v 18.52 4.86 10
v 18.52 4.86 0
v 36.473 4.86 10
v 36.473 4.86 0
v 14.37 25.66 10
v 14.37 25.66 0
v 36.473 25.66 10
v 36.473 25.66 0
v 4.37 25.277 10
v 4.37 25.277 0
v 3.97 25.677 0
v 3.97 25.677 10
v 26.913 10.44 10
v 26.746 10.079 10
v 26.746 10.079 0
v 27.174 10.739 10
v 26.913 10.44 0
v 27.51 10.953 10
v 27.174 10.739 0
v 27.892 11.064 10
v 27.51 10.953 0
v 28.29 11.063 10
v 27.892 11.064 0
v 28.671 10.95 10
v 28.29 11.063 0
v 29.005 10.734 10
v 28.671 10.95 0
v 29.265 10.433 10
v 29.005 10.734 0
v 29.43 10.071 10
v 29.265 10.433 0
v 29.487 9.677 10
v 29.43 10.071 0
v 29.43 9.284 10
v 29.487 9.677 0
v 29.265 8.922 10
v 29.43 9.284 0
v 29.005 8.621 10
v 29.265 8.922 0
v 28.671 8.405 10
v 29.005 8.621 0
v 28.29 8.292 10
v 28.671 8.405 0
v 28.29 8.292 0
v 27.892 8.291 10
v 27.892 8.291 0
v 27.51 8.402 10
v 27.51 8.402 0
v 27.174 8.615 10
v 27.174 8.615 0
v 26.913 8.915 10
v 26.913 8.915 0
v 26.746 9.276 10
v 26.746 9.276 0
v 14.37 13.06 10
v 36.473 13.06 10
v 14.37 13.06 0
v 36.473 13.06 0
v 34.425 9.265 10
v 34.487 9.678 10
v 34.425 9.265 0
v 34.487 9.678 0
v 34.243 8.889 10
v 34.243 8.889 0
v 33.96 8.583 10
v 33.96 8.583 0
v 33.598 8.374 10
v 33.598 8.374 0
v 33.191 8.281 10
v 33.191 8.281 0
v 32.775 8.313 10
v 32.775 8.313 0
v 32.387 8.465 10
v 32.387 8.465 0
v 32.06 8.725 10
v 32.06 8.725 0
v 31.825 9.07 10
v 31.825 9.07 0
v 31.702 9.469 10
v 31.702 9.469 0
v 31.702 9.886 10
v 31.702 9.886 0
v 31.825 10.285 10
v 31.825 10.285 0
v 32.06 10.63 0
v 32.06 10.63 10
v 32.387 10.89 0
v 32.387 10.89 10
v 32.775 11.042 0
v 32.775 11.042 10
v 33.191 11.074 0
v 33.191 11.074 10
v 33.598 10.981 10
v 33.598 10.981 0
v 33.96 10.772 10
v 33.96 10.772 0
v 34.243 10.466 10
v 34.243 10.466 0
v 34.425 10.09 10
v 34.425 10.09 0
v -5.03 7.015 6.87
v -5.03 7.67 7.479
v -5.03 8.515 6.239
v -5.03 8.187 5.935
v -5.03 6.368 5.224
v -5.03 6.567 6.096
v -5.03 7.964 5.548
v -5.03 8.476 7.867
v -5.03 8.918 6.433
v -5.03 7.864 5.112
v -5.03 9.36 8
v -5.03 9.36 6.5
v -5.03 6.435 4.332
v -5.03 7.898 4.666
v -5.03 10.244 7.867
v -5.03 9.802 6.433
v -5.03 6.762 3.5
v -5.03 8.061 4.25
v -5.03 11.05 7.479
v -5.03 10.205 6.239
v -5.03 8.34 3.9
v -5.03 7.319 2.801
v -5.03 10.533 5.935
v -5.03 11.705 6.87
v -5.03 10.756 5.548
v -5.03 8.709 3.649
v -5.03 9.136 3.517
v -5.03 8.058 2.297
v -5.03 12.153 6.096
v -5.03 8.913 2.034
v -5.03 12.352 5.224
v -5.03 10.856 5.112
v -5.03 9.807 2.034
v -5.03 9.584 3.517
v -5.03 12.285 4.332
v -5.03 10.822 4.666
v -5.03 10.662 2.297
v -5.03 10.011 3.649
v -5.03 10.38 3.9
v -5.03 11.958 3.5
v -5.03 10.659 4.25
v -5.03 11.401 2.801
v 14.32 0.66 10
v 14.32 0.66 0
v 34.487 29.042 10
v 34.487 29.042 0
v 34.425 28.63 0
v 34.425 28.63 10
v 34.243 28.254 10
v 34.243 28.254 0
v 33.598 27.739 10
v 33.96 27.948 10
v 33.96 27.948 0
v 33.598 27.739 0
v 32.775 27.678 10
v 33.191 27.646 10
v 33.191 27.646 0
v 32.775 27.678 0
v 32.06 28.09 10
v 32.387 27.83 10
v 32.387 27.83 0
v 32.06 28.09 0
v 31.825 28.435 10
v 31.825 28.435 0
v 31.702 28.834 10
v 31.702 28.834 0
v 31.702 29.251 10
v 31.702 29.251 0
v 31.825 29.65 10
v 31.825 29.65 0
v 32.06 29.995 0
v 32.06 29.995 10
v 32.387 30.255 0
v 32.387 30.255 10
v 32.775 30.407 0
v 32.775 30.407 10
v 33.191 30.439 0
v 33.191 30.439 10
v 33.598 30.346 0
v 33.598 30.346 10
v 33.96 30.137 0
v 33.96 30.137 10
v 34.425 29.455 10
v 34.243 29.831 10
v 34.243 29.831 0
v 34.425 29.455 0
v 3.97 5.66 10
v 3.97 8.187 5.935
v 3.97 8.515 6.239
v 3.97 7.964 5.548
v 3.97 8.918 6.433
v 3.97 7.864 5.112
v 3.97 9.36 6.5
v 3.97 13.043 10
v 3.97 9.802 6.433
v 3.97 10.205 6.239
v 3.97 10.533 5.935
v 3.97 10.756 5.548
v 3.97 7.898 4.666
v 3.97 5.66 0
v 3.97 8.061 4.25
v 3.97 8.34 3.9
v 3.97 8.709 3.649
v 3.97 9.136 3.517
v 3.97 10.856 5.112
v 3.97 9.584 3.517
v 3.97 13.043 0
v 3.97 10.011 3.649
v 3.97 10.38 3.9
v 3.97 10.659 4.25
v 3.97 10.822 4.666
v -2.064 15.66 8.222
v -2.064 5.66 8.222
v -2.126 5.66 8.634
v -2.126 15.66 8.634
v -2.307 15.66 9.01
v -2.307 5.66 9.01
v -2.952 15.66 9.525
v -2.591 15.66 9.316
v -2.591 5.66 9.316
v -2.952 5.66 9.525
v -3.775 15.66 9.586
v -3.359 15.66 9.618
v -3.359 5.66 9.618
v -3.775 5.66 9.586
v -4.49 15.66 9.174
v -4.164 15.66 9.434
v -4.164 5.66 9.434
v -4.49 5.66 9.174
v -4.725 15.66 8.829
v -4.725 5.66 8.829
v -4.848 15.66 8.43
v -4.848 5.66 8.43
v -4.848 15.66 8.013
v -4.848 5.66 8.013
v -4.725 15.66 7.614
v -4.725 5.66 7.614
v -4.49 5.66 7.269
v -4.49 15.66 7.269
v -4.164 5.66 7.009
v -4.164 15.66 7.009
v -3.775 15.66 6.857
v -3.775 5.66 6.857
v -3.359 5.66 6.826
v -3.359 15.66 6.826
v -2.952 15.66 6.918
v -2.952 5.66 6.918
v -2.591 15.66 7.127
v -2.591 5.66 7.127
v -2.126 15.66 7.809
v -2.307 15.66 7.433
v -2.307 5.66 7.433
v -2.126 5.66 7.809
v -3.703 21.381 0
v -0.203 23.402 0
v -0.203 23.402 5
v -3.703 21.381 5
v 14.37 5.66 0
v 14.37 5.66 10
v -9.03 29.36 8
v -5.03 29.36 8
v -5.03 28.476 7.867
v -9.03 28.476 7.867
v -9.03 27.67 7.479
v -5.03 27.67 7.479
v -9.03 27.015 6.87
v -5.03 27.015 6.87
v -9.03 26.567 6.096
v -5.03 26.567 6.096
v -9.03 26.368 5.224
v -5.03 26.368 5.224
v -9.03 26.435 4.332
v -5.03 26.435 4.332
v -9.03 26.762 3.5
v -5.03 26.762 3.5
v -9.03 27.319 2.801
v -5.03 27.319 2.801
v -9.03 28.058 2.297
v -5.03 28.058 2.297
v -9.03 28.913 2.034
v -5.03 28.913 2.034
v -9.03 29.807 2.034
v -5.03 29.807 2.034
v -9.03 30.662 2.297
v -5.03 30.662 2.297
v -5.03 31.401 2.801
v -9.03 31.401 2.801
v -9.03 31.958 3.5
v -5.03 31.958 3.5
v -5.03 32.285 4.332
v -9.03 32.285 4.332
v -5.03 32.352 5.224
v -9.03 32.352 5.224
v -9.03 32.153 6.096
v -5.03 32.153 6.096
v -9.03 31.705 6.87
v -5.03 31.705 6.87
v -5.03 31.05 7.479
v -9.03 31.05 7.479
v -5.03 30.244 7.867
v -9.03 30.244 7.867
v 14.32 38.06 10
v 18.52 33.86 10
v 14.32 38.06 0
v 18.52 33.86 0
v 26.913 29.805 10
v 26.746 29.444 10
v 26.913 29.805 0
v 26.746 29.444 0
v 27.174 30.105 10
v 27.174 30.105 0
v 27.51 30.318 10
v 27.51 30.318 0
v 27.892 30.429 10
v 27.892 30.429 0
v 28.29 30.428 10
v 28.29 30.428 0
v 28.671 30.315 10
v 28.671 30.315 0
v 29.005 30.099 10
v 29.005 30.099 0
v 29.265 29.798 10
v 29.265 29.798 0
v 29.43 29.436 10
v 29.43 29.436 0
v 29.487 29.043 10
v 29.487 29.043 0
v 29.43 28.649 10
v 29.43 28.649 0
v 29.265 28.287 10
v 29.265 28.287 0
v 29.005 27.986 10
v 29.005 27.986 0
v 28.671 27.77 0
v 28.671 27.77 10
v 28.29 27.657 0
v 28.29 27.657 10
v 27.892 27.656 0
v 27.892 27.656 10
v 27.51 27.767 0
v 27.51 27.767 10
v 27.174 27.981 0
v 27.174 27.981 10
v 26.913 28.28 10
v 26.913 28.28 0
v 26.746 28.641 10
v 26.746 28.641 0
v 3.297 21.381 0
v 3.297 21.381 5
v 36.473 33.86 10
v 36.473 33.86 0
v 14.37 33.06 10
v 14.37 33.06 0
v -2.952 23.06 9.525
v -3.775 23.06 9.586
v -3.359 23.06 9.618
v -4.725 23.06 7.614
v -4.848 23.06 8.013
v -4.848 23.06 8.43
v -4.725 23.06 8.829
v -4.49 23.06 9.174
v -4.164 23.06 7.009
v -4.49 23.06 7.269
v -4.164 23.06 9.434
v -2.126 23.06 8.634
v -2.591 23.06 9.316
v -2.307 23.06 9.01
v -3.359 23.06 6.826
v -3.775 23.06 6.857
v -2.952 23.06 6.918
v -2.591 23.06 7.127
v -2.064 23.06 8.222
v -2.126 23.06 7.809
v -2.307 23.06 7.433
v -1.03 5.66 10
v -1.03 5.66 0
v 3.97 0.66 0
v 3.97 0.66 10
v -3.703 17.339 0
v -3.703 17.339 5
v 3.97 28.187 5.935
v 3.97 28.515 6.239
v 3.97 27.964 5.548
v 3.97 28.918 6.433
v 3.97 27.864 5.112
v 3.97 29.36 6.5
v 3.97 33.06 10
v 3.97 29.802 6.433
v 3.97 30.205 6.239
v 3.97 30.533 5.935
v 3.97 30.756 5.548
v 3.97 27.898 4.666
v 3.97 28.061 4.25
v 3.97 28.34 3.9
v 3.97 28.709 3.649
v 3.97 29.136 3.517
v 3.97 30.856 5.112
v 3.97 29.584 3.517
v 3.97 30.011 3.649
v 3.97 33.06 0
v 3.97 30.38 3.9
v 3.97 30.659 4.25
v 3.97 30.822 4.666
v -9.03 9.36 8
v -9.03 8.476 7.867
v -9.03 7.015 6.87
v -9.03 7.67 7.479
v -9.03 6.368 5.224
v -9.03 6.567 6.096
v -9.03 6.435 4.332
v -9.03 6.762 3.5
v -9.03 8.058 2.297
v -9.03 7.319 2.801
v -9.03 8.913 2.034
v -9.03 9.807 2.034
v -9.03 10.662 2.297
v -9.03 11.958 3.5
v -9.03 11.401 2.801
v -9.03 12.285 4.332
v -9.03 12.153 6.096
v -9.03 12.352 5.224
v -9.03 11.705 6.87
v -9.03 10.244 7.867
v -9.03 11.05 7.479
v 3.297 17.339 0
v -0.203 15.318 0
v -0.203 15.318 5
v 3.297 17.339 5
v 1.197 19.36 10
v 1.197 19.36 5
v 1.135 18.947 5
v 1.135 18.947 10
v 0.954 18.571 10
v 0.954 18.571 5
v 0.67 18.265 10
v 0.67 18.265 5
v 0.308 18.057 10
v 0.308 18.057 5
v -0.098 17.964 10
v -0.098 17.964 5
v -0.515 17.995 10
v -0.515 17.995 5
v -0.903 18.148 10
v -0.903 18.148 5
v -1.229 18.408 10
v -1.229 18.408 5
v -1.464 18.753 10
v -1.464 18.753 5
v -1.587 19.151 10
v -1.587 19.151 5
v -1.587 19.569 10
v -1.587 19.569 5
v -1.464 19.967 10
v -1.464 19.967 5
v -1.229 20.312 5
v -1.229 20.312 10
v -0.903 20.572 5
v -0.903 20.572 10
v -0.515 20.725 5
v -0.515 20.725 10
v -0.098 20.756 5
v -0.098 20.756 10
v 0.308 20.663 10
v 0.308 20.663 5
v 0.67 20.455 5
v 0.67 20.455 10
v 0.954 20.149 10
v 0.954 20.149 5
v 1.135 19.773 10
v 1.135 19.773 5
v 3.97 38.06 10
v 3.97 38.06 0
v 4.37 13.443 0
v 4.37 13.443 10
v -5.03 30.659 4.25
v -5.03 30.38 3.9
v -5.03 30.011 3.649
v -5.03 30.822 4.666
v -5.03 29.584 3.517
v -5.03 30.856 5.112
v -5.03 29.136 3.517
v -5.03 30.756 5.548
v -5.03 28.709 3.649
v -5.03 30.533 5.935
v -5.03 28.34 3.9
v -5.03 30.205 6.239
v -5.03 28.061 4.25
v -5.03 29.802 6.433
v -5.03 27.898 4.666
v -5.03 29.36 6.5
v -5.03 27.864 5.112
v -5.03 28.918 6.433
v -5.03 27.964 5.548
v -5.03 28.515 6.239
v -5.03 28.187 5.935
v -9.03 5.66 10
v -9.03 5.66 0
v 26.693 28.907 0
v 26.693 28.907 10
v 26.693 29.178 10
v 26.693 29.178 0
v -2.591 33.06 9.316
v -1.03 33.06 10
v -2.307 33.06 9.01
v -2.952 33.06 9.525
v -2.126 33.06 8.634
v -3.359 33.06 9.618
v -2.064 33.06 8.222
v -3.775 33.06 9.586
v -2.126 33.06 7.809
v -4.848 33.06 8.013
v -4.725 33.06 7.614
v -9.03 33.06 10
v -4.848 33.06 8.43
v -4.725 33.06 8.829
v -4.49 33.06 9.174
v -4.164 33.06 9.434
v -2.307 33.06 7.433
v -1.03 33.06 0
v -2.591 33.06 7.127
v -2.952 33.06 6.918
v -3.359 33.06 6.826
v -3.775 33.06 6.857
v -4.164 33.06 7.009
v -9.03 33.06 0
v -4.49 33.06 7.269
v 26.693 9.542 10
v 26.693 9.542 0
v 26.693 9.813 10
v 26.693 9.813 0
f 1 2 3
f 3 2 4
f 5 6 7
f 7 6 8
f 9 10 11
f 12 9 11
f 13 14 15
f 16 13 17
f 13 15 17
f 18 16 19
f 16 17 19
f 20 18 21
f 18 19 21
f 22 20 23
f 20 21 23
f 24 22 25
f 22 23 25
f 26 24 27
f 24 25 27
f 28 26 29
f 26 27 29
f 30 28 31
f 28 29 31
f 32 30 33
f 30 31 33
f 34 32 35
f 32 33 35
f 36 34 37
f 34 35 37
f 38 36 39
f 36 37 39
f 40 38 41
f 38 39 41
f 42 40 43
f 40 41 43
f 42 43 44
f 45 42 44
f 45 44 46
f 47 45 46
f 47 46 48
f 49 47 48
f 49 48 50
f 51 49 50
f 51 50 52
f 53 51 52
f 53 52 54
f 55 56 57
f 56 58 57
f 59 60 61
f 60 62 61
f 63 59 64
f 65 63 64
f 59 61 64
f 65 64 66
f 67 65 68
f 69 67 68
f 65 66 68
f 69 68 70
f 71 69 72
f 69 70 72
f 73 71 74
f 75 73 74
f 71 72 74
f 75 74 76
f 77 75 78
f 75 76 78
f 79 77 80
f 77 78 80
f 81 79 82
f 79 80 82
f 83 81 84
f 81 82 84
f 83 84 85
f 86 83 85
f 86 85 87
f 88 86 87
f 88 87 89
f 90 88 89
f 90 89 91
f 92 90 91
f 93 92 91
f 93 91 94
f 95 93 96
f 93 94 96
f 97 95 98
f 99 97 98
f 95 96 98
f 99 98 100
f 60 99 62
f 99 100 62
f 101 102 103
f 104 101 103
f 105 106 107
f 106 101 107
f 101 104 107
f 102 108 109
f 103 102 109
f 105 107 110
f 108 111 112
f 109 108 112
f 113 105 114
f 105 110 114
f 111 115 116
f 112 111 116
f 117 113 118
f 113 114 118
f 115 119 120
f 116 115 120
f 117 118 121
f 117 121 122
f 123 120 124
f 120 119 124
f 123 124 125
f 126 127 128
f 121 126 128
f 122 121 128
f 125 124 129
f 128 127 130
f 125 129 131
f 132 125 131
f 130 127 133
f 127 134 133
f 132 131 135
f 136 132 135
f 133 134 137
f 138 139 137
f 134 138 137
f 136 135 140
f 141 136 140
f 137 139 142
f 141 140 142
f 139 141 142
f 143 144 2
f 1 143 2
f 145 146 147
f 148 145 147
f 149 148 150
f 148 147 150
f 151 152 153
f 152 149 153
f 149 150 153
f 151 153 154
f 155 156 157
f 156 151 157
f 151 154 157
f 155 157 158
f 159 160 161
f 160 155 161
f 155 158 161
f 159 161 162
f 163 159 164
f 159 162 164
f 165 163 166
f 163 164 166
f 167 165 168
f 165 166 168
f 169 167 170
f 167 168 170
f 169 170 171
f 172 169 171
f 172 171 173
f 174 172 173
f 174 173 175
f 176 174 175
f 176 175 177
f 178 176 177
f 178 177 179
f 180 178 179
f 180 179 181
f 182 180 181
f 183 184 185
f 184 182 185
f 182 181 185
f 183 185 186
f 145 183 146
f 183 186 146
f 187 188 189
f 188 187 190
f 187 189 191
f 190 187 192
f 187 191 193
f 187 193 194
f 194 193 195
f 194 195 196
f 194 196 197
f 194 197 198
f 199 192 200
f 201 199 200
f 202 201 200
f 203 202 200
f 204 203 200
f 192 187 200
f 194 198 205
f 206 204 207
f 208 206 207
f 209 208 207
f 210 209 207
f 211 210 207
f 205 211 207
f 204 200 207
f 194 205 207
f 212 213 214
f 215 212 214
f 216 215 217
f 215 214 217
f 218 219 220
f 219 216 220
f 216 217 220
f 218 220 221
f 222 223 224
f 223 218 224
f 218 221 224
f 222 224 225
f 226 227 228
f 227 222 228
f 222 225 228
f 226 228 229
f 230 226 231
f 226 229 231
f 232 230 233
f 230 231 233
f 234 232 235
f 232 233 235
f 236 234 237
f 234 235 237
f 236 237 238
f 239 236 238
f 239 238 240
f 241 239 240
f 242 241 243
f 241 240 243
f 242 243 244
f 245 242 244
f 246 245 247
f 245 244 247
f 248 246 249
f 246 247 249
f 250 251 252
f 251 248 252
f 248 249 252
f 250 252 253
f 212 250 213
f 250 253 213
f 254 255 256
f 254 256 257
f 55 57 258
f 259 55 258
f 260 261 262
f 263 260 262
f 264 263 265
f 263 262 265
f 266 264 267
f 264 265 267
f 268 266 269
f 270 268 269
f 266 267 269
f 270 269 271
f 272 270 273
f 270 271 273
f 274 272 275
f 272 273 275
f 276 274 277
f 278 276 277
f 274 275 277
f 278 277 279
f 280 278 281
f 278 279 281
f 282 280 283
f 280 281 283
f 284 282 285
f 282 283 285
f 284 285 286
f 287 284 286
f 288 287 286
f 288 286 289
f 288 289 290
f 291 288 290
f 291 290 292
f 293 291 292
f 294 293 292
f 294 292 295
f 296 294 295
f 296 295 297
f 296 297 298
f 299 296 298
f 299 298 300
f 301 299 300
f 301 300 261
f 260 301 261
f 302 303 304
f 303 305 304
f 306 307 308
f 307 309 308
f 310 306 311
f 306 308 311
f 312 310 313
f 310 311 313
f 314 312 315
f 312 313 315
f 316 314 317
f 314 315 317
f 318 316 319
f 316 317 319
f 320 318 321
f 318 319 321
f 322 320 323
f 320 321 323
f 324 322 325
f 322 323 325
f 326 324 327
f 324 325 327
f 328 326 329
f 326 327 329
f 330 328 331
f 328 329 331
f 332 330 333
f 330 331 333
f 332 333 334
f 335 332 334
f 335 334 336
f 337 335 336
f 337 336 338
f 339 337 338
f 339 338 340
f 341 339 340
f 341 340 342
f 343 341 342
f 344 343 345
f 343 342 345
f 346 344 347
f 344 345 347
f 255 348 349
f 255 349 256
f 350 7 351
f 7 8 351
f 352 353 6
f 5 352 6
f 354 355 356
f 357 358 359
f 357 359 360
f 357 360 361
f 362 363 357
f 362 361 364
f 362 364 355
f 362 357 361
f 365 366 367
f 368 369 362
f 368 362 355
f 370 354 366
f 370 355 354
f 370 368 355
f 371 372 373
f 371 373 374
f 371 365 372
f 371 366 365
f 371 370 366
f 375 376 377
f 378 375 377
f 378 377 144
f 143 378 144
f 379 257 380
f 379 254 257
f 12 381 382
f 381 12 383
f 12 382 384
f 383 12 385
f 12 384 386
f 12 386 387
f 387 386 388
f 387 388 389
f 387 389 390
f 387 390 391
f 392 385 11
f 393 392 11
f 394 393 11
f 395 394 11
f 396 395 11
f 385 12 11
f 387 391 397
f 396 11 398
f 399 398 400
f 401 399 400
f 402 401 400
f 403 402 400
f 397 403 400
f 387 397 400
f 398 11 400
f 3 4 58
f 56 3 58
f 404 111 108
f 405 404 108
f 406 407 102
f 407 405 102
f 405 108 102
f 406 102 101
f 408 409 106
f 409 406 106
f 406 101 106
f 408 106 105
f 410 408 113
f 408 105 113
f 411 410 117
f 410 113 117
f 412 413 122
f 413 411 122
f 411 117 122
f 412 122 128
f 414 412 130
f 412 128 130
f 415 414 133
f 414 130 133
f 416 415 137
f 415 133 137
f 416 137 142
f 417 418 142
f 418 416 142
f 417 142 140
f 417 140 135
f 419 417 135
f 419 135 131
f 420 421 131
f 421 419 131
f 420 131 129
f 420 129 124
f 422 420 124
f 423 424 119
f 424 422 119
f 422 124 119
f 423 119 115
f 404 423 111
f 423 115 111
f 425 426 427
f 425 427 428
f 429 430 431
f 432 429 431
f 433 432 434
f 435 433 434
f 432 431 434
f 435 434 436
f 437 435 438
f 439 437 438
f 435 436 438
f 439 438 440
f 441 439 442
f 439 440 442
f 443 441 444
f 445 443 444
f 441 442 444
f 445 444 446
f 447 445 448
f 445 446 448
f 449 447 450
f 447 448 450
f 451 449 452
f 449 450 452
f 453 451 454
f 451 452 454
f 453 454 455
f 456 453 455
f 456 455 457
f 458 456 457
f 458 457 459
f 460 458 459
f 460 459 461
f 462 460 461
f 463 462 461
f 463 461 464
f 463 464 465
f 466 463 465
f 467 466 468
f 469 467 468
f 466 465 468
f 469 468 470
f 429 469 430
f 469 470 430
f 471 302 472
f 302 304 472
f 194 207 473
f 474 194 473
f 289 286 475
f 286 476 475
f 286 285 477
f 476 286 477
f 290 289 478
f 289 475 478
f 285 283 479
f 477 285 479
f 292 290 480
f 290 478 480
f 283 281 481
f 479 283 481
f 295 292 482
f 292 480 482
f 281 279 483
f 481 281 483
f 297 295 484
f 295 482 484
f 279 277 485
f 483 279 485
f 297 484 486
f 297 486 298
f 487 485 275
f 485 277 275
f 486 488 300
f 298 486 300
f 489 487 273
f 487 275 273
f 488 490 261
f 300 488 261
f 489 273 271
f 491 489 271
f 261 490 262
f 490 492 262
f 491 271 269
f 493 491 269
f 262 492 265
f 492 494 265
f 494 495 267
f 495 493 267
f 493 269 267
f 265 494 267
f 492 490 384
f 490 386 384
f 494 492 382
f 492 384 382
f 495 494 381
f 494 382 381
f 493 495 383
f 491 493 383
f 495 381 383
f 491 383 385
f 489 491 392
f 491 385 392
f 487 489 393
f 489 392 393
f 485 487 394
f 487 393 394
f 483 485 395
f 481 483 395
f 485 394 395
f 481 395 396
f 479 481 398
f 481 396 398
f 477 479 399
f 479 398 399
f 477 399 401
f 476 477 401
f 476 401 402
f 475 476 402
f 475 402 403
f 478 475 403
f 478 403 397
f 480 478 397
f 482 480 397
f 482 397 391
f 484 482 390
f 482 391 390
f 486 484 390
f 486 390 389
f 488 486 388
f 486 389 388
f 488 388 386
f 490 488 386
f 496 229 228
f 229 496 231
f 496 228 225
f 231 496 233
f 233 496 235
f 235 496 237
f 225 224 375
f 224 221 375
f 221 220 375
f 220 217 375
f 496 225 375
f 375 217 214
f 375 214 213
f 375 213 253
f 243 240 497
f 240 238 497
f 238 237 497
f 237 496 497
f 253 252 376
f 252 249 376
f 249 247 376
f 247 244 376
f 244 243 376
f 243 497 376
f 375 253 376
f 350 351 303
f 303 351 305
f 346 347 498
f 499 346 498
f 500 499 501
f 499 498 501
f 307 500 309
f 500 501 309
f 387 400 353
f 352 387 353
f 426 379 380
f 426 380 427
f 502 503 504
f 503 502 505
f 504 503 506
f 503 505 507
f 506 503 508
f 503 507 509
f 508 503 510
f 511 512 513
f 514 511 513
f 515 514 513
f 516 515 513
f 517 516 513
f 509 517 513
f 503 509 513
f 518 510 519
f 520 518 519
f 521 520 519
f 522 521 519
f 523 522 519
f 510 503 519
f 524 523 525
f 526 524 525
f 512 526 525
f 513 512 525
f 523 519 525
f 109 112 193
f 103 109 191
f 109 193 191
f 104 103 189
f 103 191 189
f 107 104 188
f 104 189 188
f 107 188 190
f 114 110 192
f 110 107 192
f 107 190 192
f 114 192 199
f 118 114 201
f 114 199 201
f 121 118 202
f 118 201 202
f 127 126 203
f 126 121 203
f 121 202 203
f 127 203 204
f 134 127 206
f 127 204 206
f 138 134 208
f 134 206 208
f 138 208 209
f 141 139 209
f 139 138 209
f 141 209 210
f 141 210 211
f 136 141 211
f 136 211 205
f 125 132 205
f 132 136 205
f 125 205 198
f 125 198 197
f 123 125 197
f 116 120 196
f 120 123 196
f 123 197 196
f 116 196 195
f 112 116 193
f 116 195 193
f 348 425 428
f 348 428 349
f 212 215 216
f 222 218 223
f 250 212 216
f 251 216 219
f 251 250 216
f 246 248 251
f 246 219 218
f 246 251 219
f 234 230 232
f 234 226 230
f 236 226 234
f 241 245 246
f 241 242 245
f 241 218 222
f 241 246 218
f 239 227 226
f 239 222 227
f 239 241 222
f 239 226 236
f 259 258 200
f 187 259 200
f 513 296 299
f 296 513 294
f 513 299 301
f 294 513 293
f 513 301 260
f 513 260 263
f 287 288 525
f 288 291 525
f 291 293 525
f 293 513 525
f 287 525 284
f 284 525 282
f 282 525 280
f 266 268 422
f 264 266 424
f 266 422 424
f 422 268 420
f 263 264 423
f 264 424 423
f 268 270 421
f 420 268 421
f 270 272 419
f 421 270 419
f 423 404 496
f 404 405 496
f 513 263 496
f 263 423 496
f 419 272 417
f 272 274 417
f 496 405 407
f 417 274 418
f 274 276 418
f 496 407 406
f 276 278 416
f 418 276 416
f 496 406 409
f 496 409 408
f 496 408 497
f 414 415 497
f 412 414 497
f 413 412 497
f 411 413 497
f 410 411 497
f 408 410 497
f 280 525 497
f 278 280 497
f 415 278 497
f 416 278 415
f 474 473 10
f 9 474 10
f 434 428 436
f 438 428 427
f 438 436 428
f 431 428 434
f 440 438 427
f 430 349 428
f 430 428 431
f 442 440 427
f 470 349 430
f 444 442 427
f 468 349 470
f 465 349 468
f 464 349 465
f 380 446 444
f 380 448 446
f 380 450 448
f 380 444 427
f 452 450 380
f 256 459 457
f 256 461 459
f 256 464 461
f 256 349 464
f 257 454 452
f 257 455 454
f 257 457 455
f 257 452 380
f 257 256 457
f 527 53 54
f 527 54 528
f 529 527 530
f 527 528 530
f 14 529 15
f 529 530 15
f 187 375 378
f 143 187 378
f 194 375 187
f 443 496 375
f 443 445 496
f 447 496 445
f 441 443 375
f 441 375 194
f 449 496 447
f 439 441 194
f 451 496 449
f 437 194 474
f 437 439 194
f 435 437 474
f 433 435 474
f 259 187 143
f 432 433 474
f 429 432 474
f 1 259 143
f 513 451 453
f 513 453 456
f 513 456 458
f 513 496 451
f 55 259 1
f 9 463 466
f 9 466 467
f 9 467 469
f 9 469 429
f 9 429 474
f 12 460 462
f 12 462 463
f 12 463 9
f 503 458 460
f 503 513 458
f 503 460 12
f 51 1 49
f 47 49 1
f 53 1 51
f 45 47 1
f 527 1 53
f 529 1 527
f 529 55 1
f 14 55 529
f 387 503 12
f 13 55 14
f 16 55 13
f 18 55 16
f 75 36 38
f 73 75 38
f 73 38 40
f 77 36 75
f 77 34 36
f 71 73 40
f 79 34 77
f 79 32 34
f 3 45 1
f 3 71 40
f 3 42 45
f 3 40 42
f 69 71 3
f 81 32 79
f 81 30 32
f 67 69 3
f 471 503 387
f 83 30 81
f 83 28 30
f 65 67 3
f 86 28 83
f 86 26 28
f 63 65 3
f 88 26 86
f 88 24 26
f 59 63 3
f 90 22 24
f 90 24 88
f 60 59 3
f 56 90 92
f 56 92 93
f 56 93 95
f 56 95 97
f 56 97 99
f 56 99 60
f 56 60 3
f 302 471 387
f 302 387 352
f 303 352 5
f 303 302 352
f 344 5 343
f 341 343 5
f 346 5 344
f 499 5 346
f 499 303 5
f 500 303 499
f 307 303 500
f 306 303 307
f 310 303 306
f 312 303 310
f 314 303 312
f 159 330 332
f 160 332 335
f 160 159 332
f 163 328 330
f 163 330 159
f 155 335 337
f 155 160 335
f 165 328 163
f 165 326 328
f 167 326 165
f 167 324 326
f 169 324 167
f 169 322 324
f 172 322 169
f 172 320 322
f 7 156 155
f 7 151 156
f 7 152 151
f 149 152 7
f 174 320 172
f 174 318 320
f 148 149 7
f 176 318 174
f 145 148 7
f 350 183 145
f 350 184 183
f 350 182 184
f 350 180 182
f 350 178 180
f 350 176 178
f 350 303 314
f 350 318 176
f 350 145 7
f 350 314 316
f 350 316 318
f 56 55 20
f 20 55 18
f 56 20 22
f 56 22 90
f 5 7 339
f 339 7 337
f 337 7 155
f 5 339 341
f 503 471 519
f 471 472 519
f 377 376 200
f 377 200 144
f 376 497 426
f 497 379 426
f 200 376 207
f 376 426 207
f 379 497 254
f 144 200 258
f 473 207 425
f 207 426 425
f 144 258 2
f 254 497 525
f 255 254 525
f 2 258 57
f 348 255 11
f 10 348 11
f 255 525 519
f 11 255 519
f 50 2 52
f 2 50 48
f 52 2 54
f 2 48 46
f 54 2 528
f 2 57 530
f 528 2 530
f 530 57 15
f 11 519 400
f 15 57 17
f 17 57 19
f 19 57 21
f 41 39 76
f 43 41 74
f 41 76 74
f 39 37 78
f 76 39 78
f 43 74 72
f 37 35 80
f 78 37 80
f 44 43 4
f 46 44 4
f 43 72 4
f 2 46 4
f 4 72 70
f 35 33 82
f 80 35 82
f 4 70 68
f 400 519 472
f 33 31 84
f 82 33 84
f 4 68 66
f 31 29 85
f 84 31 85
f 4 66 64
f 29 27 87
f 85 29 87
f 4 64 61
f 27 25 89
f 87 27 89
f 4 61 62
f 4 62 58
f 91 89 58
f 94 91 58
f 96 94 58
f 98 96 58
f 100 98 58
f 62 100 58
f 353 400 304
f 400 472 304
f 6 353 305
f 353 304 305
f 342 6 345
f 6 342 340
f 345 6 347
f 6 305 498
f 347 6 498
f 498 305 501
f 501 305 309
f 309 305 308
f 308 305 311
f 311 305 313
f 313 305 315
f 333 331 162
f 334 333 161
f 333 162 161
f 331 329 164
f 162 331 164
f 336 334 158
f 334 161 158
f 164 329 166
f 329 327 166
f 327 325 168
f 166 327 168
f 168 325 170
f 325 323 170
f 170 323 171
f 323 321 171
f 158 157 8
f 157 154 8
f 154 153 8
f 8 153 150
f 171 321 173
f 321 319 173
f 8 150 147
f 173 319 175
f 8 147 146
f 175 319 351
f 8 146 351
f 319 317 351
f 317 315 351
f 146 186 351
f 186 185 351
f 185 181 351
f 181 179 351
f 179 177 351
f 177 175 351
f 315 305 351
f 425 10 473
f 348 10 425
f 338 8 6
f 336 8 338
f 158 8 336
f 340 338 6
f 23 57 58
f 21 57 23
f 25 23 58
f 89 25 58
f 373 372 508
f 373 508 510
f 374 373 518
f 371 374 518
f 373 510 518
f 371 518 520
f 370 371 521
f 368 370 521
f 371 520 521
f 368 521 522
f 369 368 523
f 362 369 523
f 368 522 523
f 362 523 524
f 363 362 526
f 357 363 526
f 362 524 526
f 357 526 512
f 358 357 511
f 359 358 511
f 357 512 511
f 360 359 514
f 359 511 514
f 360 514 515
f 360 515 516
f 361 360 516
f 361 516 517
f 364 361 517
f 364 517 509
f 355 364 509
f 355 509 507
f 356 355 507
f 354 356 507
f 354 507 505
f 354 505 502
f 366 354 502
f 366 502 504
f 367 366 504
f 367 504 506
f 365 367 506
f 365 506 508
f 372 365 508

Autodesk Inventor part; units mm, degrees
ref_plane "YZ Plane" through (0, 0, 0) normal (1, 0, 0) x (0, 1, 0)
ref_plane "XZ Plane" through (0, 0, 0) normal (0, 1, 0) x (-1, 0, 0)
ref_plane "XY Plane" through (0, 0, 0) normal (0, 0, 1) x (1, 0, 0)
ref_plane "Arbeitsebene1" through (0, 0, 0) normal (0, 0, 1) x (1, 0, 0)
sketch "Skizze1" plane through (0, 0, 0) normal (0, 0, 1) x (1, 0, 0)
  arc A0 (12.7966, 13.5152) -> (12.2972, 14.0928) centre (11.6862, 13.06) ccw construction
  arc A1 (12.1755, 14.2862) -> (12.2972, 14.0928) centre (12.4245, 14.308) ccw construction
  line L0 (12.1755, 14.2862) -> (12.1453, 14.6318) construction
  arc A2 (12.1453, 14.6318) -> (11.8962, 14.86) centre (11.8962, 14.61) ccw construction
  line L1 (11.8962, 14.86) -> (11.4438, 14.86) construction
  arc A3 (11.4438, 14.86) -> (11.1947, 14.6318) centre (11.4438, 14.61) ccw construction
  line L2 (11.1947, 14.6318) -> (11.1627, 14.2652) construction
  arc A4 (11.0468, 14.0755) -> (11.1627, 14.2652) centre (10.9136, 14.287) ccw construction
  arc A5 (11.0468, 14.0755) -> (10.5759, 13.5152) centre (11.6862, 13.06) ccw construction
  arc A6 (10.3446, 13.36) -> (10.5759, 13.5152) centre (10.3446, 13.61) ccw construction
  line L3 (10.3446, 13.36) -> (9.67, 13.36) construction
  line L4 (9.67, 13.36) -> (9.17, 13.86) construction
  line L5 (9.17, 13.86) -> (9.17, 24.86) construction
  line L6 (9.17, 24.86) -> (9.67, 25.36) construction
  line L7 (9.67, 25.36) -> (10.3446, 25.36) construction
  arc A7 (10.5759, 25.2048) -> (10.3446, 25.36) centre (10.3446, 25.11) ccw construction
  arc A8 (10.5759, 25.2048) -> (11.0468, 24.6445) centre (11.6862, 25.66) ccw construction
  arc A9 (11.1627, 24.4548) -> (11.0468, 24.6445) centre (10.9136, 24.433) ccw construction
  line L8 (11.1627, 24.4548) -> (11.1947, 24.0882) construction
  arc A10 (11.1947, 24.0882) -> (11.4438, 23.86) centre (11.4438, 24.11) ccw construction
  line L9 (11.4438, 23.86) -> (11.8962, 23.86) construction
  arc A11 (11.8962, 23.86) -> (12.1453, 24.0882) centre (11.8962, 24.11) ccw construction
  line L10 (12.1453, 24.0882) -> (12.1755, 24.4338) construction
  arc A12 (12.2972, 24.6272) -> (12.1755, 24.4338) centre (12.4245, 24.412) ccw construction
  arc A13 (12.2972, 24.6272) -> (12.7966, 25.2048) centre (11.6862, 25.66) ccw construction
  arc A14 (13.0279, 25.36) -> (12.7966, 25.2048) centre (13.0279, 25.11) ccw construction
  line L11 (13.0279, 25.36) -> (14.17, 25.36) construction
  line L12 (14.17, 25.36) -> (14.17, 32.26) construction
  line L13 (14.17, 32.26) -> (13.57, 32.86) construction
  line L14 (13.57, 32.86) -> (10.17, 32.86) construction
  arc A15 (9.37, 32.86) -> (10.17, 32.86) centre (9.77, 33.16) ccw construction
  line L15 (9.37, 32.86) -> (4.77, 32.86) construction
  line L16 (4.77, 32.86) -> (4.17, 32.26) construction
  line L17 (4.17, 32.26) -> (4.17, 25.76) construction
  line L18 (4.17, 25.76) -> (4.57, 25.36) construction
  line L19 (4.57, 25.36) -> (4.57, 13.36) construction
  line L20 (4.57, 13.36) -> (4.17, 12.96) construction
  line L21 (4.17, 12.96) -> (4.17, 6.46) construction
  line L22 (4.17, 6.46) -> (4.77, 5.86) construction
  line L23 (4.77, 5.86) -> (13.57, 5.86) construction
  line L24 (13.57, 5.86) -> (14.17, 6.46) construction
  line L25 (14.17, 6.46) -> (14.17, 13.36) construction
  line L26 (14.17, 13.36) -> (13.0279, 13.36) construction
  arc A16 (12.7966, 13.5152) -> (13.0279, 13.36) centre (13.0279, 13.61) ccw construction
  line L27 (13.6528, 5.66) -> (4.6872, 5.66) construction
  line L28 (4.6872, 5.66) -> (3.97, 6.3772) construction
  line L29 (3.97, 6.3772) -> (3.97, 13.0428) construction
  line L30 (3.97, 13.0428) -> (4.37, 13.4428) construction
  line L31 (4.37, 13.4428) -> (4.37, 25.2772) construction
  line L32 (4.37, 25.2772) -> (3.97, 25.6772) construction
  line L33 (3.97, 25.6772) -> (3.97, 32.3428) construction
  line L34 (3.97, 32.3428) -> (4.6872, 33.06) construction
  line L35 (4.6872, 33.06) -> (9.4872, 33.06) construction
  arc A17 (9.4872, 33.06) -> (10.0528, 33.06) centre (9.77, 33.16) ccw construction
  line L36 (10.0528, 33.06) -> (13.6528, 33.06) construction
  line L37 (13.6528, 33.06) -> (14.37, 32.3428) construction
  line L38 (14.37, 32.3428) -> (14.37, 25.16) construction
  line L39 (14.37, 25.16) -> (13.0279, 25.16) construction
  arc A18 (13.0279, 25.16) -> (12.9816, 25.129) centre (13.0279, 25.11) ccw construction
  arc A19 (12.3991, 24.4551) -> (12.9816, 25.129) centre (11.6862, 25.66) ccw construction
  arc A20 (12.3991, 24.4551) -> (12.3747, 24.4164) centre (12.4245, 24.412) ccw construction
  line L40 (12.3747, 24.4164) -> (12.3445, 24.0708) construction
  arc A21 (11.8962, 23.66) -> (12.3445, 24.0708) centre (11.8962, 24.11) ccw construction
  line L41 (11.8962, 23.66) -> (11.4438, 23.66) construction
  arc A22 (10.9955, 24.0708) -> (11.4438, 23.66) centre (11.4438, 24.11) ccw construction
  line L42 (10.9955, 24.0708) -> (10.9634, 24.4373) construction
  arc A23 (10.9634, 24.4373) -> (10.9403, 24.4753) centre (10.9136, 24.433) ccw construction
  arc A24 (10.3909, 25.129) -> (10.9403, 24.4753) centre (11.6862, 25.66) ccw construction
  arc A25 (10.3909, 25.129) -> (10.3446, 25.16) centre (10.3446, 25.11) ccw construction
  line L43 (10.3446, 25.16) -> (9.7528, 25.16) construction
  line L44 (9.7528, 25.16) -> (9.37, 24.7772) construction
  line L45 (9.37, 24.7772) -> (9.37, 13.9428) construction
  line L46 (9.37, 13.9428) -> (9.7528, 13.56) construction
  line L47 (9.7528, 13.56) -> (10.3446, 13.56) construction
  arc A26 (10.3446, 13.56) -> (10.3909, 13.591) centre (10.3446, 13.61) ccw construction
  arc A27 (10.9403, 14.2447) -> (10.3909, 13.591) centre (11.6862, 13.06) ccw construction
  arc A28 (10.9403, 14.2447) -> (10.9634, 14.2827) centre (10.9136, 14.287) ccw construction
  line L48 (10.9634, 14.2827) -> (10.9955, 14.6492) construction
  arc A29 (11.4438, 15.06) -> (10.9955, 14.6492) centre (11.4438, 14.61) ccw construction
  line L49 (11.4438, 15.06) -> (11.8962, 15.06) construction
  arc A30 (12.3445, 14.6492) -> (11.8962, 15.06) centre (11.8962, 14.61) ccw construction
  line L50 (12.3445, 14.6492) -> (12.3747, 14.3036) construction
  arc A31 (12.3747, 14.3036) -> (12.3991, 14.2649) centre (12.4245, 14.308) ccw construction
  arc A32 (12.9816, 13.591) -> (12.3991, 14.2649) centre (11.6862, 13.06) ccw construction
  arc A33 (12.9816, 13.591) -> (13.0279, 13.56) centre (13.0279, 13.61) ccw construction
  line L51 (13.0279, 13.56) -> (14.37, 13.56) construction
  line L52 (14.37, 13.56) -> (14.37, 6.3772) construction
  line L53 (14.37, 6.3772) -> (13.6528, 5.66) construction
  line L54 (16.97, 24.8315) -> (24.85, 24.8315) construction
  line L55 (24.85, 36.23) -> (20.77, 36.23) construction
  line L56 (20.77, 36.23) -> (16.87, 36.23) construction
  line L57 (14.37, 25.66) -> (36.4731, 25.66)
  line L58 (14.37, 25.66) -> (36.4731, 25.66) construction
  line L59 (36.4731, 25.66) -> (36.4731, 33.86)
  line L60 (36.4731, 33.86) -> (18.5197, 33.86)
  line L61 (18.5197, 33.86) -> (14.3197, 38.06)
  line L62 (14.3197, 38.06) -> (3.97, 38.06)
  line L63 (-9.03, 33.06) -> (-9.03, 19.36)
  line L64 (-9.03, 19.36) -> (4.37, 19.36)
  line L65 (4.37, 19.36) -> (4.37, 25.2772)
  line L66 (4.37, 25.2772) -> (3.97, 25.6772)
  line L67 (3.97, 25.6772) -> (3.97, 33.06)
  line L68 (3.97, 33.06) -> (14.37, 33.06)
  line L69 (14.37, 33.06) -> (14.37, 25.66)
  circle A34 centre (-3.43, 19.36) radius 1.75 construction
  circle A35 centre (-0.2031, 19.36) radius 1.4
  circle A36 centre (60.62, 30.4425) radius 2.45 projected
  circle A37 centre (35.7803, 19.36) radius 2.45 projected
  circle A38 centre (60.62, 8.3286) radius 2.45 projected
  line L70 (29.0574, 13.415) -> (26.7455, 13.415) projected
  line L71 (26.7455, 13.415) -> (26.7455, 10.1303) projected
  arc A39 (26.7455, 9.327) -> (26.7455, 10.1303) centre (28.0867, 9.7286) ccw projected
  line L72 (26.7455, 9.327) -> (26.7455, 5.8628) projected
  line L73 (26.7455, 5.8628) -> (35.12, 4.36) projected
  line L74 (35.12, 4.36) -> (65.12, 4.36) projected
  line L75 (65.12, 4.36) -> (65.12, 34.36) projected
  line L76 (65.12, 34.36) -> (35.12, 34.36) projected
  line L77 (35.12, 34.36) -> (26.7455, 32.9029) projected
  line L78 (26.7455, 32.9029) -> (26.7455, 29.4442) projected
  arc A40 (26.7455, 28.6409) -> (26.7455, 29.4442) centre (28.0867, 29.0425) ccw projected
  line L79 (26.7455, 28.6409) -> (26.7455, 25.3561) projected
  line L80 (26.7455, 25.3561) -> (29.0574, 25.3561) projected
  line L81 (29.0574, 25.3561) -> (29.0574, 13.415) projected
  circle A41 centre (50.12, 19.36) radius 10.5 projected
  circle A42 centre (33.0867, 29.0425) radius 1.4 projected
  circle A43 centre (33.0867, 9.7286) radius 1.4 projected
  line L82 (36.7731, 34.36) -> (36.7731, 25.3561) projected
  line L83 (36.7731, 13.415) -> (36.7731, 4.36) projected
  circle A44 centre (33.0867, 29.0425) radius 1.4
  circle A45 centre (28.0867, 29.0425) radius 1.4
  line L84 (3.97, 38.06) -> (-1.03, 33.06)
  line L85 (3.97, 38.06) -> (11.0411, 38.06) construction
  line L86 (-1.03, 33.06) -> (-9.03, 33.06)
  point P0 (0, 0)
  point P1 (1.1969, 19.36)
  point P2 (-1.6031, 19.36)
  dimension "d0" = 0.2
  dimension "d2" = 5
  dimension "d4" = 13
  dimension "d5" = 2.8
  dimension "d7" = 0.5
  dimension "d8" = 3.5
  dimension "d19" = 0.3
  dimension "d20" = 0.5
  dimension "d21" = 135
  dimension "d28" = 8.8269
extrude "Extrusion1" add sketch "Skizze1" along normal blind 10 contours L69 L68 L67 L66 L65 L64 A35 L63 L86 L84 L62 L61 L60 L77 L78 A45 L79 L57 | L79 A40 L78 L77 L60 L59 L57
sketch "Skizze2" plane through (-9.03, 19.36, 0) normal (-1, 0, 0) x (0, 0, 1)
  circle A0 centre (12.1869, 10) radius 1.75 projected
  line L0 (0, 13.7) -> (0, 0) projected
  line L1 (0, 0) -> (10, 0) projected
  line L2 (10, 13.7) -> (10, 0) projected
  line L3 (0, 13.7) -> (10, 13.7) projected
  circle A1 centre (5, 10) radius 1.5
  point P0 (0, -19.36)
  dimension "d11" = 3
hole "Bohrung1" at (-9.03, 29.36, 5) direction (1, 0, 0) diameter 3 depth 20 tip angle 118 counterbore diameter 6 counterbore depth 4
sketch "Skizze3" plane through (-9.03, 33.06, 0) normal (0, 1, 0) x (1, 0, 0)
  line L0 (4.1, -9.9) -> (4.1, 19.6933)
  line L1 (7.1, -9.9) -> (7.1, 19.6933)
  circle A0 centre (5.5663, -8.2216) radius 1.4
  point P0 (9.03, 0)
  dimension "d22" = 2.8
extrude "Extrusion2" cut sketch "Skizze3" against normal blind 10
mirror "Spiegeln2" about plane through (-9.03, 19.36, 0) normal (0, -1, 0) of "Extrusion1", "Bohrung1", "Extrusion2"
sketch "Skizze4" plane through (0, 0, 0) normal (0, 0, -1) x (-1, 0, 0)
  circle A0 centre (0.2031, 19.36) radius 1.4 projected
  circle A1 centre (-28.0867, 9.6775) radius 1.4 projected
  circle A2 centre (-33.0867, 9.6775) radius 1.4 projected
  line L0 (-4.37, 13.4428) -> (-4.37, 25.2772) projected
  line L1 (-4.37, 13.4428) -> (-3.97, 13.0428) projected
  line L2 (-3.97, 13.0428) -> (-3.97, 5.66) projected
  line L3 (-3.97, 5.66) -> (-14.37, 5.66) projected
  line L4 (-14.37, 5.66) -> (-14.37, 13.06) projected
  line L5 (-14.37, 13.06) -> (-36.4731, 13.06) projected
  line L6 (-36.4731, 13.06) -> (-36.4731, 4.86) projected
  line L7 (-36.4731, 4.86) -> (-18.5197, 4.86) projected
  line L8 (-18.5197, 4.86) -> (-14.3197, 0.66) projected
  line L9 (-14.3197, 0.66) -> (-3.97, 0.66) projected
  line L10 (-3.97, 0.66) -> (1.03, 5.66) projected
  line L11 (1.03, 5.66) -> (9.03, 5.66) projected
  line L12 (9.03, 33.06) -> (9.03, 5.66) projected
  line L13 (1.03, 33.06) -> (9.03, 33.06) projected
  line L14 (-3.97, 38.06) -> (1.03, 33.06) projected
  line L15 (-14.3197, 38.06) -> (-3.97, 38.06) projected
  line L16 (-18.5197, 33.86) -> (-14.3197, 38.06) projected
  line L17 (-36.4731, 33.86) -> (-18.5197, 33.86) projected
  line L18 (-36.4731, 25.66) -> (-36.4731, 33.86) projected
  line L19 (-14.37, 25.66) -> (-36.4731, 25.66) projected
  line L20 (-14.37, 33.06) -> (-14.37, 25.66) projected
  line L21 (-3.97, 33.06) -> (-14.37, 33.06) projected
  line L22 (-3.97, 25.6772) -> (-3.97, 33.06) projected
  line L23 (-4.37, 25.2772) -> (-3.97, 25.6772) projected
  circle A3 centre (-33.0867, 29.0425) radius 1.4 projected
  circle A4 centre (-28.0867, 29.0425) radius 1.4 projected
  line L24 (-3.2969, 21.3807) -> (0.2031, 23.4015)
  line L25 (0.2031, 23.4015) -> (3.7031, 21.3807)
  line L26 (3.7031, 21.3807) -> (3.7031, 17.3393)
  line L27 (3.7031, 17.3393) -> (0.2031, 15.3185)
  line L28 (0.2031, 15.3185) -> (-3.2969, 17.3393)
  line L29 (-3.2969, 17.3393) -> (-3.2969, 21.3807)
  point P0 (0, 0)
  dimension "d25" = 7
extrude "Extrusion3" cut sketch "Skizze4" against normal blind 5 contours A0 | L24 L25 L26 L27 L28 L29
properties part number "30_Cube_Cube_Z_Focus_MGN_NEMA_belt_pushing_slide_v3"
